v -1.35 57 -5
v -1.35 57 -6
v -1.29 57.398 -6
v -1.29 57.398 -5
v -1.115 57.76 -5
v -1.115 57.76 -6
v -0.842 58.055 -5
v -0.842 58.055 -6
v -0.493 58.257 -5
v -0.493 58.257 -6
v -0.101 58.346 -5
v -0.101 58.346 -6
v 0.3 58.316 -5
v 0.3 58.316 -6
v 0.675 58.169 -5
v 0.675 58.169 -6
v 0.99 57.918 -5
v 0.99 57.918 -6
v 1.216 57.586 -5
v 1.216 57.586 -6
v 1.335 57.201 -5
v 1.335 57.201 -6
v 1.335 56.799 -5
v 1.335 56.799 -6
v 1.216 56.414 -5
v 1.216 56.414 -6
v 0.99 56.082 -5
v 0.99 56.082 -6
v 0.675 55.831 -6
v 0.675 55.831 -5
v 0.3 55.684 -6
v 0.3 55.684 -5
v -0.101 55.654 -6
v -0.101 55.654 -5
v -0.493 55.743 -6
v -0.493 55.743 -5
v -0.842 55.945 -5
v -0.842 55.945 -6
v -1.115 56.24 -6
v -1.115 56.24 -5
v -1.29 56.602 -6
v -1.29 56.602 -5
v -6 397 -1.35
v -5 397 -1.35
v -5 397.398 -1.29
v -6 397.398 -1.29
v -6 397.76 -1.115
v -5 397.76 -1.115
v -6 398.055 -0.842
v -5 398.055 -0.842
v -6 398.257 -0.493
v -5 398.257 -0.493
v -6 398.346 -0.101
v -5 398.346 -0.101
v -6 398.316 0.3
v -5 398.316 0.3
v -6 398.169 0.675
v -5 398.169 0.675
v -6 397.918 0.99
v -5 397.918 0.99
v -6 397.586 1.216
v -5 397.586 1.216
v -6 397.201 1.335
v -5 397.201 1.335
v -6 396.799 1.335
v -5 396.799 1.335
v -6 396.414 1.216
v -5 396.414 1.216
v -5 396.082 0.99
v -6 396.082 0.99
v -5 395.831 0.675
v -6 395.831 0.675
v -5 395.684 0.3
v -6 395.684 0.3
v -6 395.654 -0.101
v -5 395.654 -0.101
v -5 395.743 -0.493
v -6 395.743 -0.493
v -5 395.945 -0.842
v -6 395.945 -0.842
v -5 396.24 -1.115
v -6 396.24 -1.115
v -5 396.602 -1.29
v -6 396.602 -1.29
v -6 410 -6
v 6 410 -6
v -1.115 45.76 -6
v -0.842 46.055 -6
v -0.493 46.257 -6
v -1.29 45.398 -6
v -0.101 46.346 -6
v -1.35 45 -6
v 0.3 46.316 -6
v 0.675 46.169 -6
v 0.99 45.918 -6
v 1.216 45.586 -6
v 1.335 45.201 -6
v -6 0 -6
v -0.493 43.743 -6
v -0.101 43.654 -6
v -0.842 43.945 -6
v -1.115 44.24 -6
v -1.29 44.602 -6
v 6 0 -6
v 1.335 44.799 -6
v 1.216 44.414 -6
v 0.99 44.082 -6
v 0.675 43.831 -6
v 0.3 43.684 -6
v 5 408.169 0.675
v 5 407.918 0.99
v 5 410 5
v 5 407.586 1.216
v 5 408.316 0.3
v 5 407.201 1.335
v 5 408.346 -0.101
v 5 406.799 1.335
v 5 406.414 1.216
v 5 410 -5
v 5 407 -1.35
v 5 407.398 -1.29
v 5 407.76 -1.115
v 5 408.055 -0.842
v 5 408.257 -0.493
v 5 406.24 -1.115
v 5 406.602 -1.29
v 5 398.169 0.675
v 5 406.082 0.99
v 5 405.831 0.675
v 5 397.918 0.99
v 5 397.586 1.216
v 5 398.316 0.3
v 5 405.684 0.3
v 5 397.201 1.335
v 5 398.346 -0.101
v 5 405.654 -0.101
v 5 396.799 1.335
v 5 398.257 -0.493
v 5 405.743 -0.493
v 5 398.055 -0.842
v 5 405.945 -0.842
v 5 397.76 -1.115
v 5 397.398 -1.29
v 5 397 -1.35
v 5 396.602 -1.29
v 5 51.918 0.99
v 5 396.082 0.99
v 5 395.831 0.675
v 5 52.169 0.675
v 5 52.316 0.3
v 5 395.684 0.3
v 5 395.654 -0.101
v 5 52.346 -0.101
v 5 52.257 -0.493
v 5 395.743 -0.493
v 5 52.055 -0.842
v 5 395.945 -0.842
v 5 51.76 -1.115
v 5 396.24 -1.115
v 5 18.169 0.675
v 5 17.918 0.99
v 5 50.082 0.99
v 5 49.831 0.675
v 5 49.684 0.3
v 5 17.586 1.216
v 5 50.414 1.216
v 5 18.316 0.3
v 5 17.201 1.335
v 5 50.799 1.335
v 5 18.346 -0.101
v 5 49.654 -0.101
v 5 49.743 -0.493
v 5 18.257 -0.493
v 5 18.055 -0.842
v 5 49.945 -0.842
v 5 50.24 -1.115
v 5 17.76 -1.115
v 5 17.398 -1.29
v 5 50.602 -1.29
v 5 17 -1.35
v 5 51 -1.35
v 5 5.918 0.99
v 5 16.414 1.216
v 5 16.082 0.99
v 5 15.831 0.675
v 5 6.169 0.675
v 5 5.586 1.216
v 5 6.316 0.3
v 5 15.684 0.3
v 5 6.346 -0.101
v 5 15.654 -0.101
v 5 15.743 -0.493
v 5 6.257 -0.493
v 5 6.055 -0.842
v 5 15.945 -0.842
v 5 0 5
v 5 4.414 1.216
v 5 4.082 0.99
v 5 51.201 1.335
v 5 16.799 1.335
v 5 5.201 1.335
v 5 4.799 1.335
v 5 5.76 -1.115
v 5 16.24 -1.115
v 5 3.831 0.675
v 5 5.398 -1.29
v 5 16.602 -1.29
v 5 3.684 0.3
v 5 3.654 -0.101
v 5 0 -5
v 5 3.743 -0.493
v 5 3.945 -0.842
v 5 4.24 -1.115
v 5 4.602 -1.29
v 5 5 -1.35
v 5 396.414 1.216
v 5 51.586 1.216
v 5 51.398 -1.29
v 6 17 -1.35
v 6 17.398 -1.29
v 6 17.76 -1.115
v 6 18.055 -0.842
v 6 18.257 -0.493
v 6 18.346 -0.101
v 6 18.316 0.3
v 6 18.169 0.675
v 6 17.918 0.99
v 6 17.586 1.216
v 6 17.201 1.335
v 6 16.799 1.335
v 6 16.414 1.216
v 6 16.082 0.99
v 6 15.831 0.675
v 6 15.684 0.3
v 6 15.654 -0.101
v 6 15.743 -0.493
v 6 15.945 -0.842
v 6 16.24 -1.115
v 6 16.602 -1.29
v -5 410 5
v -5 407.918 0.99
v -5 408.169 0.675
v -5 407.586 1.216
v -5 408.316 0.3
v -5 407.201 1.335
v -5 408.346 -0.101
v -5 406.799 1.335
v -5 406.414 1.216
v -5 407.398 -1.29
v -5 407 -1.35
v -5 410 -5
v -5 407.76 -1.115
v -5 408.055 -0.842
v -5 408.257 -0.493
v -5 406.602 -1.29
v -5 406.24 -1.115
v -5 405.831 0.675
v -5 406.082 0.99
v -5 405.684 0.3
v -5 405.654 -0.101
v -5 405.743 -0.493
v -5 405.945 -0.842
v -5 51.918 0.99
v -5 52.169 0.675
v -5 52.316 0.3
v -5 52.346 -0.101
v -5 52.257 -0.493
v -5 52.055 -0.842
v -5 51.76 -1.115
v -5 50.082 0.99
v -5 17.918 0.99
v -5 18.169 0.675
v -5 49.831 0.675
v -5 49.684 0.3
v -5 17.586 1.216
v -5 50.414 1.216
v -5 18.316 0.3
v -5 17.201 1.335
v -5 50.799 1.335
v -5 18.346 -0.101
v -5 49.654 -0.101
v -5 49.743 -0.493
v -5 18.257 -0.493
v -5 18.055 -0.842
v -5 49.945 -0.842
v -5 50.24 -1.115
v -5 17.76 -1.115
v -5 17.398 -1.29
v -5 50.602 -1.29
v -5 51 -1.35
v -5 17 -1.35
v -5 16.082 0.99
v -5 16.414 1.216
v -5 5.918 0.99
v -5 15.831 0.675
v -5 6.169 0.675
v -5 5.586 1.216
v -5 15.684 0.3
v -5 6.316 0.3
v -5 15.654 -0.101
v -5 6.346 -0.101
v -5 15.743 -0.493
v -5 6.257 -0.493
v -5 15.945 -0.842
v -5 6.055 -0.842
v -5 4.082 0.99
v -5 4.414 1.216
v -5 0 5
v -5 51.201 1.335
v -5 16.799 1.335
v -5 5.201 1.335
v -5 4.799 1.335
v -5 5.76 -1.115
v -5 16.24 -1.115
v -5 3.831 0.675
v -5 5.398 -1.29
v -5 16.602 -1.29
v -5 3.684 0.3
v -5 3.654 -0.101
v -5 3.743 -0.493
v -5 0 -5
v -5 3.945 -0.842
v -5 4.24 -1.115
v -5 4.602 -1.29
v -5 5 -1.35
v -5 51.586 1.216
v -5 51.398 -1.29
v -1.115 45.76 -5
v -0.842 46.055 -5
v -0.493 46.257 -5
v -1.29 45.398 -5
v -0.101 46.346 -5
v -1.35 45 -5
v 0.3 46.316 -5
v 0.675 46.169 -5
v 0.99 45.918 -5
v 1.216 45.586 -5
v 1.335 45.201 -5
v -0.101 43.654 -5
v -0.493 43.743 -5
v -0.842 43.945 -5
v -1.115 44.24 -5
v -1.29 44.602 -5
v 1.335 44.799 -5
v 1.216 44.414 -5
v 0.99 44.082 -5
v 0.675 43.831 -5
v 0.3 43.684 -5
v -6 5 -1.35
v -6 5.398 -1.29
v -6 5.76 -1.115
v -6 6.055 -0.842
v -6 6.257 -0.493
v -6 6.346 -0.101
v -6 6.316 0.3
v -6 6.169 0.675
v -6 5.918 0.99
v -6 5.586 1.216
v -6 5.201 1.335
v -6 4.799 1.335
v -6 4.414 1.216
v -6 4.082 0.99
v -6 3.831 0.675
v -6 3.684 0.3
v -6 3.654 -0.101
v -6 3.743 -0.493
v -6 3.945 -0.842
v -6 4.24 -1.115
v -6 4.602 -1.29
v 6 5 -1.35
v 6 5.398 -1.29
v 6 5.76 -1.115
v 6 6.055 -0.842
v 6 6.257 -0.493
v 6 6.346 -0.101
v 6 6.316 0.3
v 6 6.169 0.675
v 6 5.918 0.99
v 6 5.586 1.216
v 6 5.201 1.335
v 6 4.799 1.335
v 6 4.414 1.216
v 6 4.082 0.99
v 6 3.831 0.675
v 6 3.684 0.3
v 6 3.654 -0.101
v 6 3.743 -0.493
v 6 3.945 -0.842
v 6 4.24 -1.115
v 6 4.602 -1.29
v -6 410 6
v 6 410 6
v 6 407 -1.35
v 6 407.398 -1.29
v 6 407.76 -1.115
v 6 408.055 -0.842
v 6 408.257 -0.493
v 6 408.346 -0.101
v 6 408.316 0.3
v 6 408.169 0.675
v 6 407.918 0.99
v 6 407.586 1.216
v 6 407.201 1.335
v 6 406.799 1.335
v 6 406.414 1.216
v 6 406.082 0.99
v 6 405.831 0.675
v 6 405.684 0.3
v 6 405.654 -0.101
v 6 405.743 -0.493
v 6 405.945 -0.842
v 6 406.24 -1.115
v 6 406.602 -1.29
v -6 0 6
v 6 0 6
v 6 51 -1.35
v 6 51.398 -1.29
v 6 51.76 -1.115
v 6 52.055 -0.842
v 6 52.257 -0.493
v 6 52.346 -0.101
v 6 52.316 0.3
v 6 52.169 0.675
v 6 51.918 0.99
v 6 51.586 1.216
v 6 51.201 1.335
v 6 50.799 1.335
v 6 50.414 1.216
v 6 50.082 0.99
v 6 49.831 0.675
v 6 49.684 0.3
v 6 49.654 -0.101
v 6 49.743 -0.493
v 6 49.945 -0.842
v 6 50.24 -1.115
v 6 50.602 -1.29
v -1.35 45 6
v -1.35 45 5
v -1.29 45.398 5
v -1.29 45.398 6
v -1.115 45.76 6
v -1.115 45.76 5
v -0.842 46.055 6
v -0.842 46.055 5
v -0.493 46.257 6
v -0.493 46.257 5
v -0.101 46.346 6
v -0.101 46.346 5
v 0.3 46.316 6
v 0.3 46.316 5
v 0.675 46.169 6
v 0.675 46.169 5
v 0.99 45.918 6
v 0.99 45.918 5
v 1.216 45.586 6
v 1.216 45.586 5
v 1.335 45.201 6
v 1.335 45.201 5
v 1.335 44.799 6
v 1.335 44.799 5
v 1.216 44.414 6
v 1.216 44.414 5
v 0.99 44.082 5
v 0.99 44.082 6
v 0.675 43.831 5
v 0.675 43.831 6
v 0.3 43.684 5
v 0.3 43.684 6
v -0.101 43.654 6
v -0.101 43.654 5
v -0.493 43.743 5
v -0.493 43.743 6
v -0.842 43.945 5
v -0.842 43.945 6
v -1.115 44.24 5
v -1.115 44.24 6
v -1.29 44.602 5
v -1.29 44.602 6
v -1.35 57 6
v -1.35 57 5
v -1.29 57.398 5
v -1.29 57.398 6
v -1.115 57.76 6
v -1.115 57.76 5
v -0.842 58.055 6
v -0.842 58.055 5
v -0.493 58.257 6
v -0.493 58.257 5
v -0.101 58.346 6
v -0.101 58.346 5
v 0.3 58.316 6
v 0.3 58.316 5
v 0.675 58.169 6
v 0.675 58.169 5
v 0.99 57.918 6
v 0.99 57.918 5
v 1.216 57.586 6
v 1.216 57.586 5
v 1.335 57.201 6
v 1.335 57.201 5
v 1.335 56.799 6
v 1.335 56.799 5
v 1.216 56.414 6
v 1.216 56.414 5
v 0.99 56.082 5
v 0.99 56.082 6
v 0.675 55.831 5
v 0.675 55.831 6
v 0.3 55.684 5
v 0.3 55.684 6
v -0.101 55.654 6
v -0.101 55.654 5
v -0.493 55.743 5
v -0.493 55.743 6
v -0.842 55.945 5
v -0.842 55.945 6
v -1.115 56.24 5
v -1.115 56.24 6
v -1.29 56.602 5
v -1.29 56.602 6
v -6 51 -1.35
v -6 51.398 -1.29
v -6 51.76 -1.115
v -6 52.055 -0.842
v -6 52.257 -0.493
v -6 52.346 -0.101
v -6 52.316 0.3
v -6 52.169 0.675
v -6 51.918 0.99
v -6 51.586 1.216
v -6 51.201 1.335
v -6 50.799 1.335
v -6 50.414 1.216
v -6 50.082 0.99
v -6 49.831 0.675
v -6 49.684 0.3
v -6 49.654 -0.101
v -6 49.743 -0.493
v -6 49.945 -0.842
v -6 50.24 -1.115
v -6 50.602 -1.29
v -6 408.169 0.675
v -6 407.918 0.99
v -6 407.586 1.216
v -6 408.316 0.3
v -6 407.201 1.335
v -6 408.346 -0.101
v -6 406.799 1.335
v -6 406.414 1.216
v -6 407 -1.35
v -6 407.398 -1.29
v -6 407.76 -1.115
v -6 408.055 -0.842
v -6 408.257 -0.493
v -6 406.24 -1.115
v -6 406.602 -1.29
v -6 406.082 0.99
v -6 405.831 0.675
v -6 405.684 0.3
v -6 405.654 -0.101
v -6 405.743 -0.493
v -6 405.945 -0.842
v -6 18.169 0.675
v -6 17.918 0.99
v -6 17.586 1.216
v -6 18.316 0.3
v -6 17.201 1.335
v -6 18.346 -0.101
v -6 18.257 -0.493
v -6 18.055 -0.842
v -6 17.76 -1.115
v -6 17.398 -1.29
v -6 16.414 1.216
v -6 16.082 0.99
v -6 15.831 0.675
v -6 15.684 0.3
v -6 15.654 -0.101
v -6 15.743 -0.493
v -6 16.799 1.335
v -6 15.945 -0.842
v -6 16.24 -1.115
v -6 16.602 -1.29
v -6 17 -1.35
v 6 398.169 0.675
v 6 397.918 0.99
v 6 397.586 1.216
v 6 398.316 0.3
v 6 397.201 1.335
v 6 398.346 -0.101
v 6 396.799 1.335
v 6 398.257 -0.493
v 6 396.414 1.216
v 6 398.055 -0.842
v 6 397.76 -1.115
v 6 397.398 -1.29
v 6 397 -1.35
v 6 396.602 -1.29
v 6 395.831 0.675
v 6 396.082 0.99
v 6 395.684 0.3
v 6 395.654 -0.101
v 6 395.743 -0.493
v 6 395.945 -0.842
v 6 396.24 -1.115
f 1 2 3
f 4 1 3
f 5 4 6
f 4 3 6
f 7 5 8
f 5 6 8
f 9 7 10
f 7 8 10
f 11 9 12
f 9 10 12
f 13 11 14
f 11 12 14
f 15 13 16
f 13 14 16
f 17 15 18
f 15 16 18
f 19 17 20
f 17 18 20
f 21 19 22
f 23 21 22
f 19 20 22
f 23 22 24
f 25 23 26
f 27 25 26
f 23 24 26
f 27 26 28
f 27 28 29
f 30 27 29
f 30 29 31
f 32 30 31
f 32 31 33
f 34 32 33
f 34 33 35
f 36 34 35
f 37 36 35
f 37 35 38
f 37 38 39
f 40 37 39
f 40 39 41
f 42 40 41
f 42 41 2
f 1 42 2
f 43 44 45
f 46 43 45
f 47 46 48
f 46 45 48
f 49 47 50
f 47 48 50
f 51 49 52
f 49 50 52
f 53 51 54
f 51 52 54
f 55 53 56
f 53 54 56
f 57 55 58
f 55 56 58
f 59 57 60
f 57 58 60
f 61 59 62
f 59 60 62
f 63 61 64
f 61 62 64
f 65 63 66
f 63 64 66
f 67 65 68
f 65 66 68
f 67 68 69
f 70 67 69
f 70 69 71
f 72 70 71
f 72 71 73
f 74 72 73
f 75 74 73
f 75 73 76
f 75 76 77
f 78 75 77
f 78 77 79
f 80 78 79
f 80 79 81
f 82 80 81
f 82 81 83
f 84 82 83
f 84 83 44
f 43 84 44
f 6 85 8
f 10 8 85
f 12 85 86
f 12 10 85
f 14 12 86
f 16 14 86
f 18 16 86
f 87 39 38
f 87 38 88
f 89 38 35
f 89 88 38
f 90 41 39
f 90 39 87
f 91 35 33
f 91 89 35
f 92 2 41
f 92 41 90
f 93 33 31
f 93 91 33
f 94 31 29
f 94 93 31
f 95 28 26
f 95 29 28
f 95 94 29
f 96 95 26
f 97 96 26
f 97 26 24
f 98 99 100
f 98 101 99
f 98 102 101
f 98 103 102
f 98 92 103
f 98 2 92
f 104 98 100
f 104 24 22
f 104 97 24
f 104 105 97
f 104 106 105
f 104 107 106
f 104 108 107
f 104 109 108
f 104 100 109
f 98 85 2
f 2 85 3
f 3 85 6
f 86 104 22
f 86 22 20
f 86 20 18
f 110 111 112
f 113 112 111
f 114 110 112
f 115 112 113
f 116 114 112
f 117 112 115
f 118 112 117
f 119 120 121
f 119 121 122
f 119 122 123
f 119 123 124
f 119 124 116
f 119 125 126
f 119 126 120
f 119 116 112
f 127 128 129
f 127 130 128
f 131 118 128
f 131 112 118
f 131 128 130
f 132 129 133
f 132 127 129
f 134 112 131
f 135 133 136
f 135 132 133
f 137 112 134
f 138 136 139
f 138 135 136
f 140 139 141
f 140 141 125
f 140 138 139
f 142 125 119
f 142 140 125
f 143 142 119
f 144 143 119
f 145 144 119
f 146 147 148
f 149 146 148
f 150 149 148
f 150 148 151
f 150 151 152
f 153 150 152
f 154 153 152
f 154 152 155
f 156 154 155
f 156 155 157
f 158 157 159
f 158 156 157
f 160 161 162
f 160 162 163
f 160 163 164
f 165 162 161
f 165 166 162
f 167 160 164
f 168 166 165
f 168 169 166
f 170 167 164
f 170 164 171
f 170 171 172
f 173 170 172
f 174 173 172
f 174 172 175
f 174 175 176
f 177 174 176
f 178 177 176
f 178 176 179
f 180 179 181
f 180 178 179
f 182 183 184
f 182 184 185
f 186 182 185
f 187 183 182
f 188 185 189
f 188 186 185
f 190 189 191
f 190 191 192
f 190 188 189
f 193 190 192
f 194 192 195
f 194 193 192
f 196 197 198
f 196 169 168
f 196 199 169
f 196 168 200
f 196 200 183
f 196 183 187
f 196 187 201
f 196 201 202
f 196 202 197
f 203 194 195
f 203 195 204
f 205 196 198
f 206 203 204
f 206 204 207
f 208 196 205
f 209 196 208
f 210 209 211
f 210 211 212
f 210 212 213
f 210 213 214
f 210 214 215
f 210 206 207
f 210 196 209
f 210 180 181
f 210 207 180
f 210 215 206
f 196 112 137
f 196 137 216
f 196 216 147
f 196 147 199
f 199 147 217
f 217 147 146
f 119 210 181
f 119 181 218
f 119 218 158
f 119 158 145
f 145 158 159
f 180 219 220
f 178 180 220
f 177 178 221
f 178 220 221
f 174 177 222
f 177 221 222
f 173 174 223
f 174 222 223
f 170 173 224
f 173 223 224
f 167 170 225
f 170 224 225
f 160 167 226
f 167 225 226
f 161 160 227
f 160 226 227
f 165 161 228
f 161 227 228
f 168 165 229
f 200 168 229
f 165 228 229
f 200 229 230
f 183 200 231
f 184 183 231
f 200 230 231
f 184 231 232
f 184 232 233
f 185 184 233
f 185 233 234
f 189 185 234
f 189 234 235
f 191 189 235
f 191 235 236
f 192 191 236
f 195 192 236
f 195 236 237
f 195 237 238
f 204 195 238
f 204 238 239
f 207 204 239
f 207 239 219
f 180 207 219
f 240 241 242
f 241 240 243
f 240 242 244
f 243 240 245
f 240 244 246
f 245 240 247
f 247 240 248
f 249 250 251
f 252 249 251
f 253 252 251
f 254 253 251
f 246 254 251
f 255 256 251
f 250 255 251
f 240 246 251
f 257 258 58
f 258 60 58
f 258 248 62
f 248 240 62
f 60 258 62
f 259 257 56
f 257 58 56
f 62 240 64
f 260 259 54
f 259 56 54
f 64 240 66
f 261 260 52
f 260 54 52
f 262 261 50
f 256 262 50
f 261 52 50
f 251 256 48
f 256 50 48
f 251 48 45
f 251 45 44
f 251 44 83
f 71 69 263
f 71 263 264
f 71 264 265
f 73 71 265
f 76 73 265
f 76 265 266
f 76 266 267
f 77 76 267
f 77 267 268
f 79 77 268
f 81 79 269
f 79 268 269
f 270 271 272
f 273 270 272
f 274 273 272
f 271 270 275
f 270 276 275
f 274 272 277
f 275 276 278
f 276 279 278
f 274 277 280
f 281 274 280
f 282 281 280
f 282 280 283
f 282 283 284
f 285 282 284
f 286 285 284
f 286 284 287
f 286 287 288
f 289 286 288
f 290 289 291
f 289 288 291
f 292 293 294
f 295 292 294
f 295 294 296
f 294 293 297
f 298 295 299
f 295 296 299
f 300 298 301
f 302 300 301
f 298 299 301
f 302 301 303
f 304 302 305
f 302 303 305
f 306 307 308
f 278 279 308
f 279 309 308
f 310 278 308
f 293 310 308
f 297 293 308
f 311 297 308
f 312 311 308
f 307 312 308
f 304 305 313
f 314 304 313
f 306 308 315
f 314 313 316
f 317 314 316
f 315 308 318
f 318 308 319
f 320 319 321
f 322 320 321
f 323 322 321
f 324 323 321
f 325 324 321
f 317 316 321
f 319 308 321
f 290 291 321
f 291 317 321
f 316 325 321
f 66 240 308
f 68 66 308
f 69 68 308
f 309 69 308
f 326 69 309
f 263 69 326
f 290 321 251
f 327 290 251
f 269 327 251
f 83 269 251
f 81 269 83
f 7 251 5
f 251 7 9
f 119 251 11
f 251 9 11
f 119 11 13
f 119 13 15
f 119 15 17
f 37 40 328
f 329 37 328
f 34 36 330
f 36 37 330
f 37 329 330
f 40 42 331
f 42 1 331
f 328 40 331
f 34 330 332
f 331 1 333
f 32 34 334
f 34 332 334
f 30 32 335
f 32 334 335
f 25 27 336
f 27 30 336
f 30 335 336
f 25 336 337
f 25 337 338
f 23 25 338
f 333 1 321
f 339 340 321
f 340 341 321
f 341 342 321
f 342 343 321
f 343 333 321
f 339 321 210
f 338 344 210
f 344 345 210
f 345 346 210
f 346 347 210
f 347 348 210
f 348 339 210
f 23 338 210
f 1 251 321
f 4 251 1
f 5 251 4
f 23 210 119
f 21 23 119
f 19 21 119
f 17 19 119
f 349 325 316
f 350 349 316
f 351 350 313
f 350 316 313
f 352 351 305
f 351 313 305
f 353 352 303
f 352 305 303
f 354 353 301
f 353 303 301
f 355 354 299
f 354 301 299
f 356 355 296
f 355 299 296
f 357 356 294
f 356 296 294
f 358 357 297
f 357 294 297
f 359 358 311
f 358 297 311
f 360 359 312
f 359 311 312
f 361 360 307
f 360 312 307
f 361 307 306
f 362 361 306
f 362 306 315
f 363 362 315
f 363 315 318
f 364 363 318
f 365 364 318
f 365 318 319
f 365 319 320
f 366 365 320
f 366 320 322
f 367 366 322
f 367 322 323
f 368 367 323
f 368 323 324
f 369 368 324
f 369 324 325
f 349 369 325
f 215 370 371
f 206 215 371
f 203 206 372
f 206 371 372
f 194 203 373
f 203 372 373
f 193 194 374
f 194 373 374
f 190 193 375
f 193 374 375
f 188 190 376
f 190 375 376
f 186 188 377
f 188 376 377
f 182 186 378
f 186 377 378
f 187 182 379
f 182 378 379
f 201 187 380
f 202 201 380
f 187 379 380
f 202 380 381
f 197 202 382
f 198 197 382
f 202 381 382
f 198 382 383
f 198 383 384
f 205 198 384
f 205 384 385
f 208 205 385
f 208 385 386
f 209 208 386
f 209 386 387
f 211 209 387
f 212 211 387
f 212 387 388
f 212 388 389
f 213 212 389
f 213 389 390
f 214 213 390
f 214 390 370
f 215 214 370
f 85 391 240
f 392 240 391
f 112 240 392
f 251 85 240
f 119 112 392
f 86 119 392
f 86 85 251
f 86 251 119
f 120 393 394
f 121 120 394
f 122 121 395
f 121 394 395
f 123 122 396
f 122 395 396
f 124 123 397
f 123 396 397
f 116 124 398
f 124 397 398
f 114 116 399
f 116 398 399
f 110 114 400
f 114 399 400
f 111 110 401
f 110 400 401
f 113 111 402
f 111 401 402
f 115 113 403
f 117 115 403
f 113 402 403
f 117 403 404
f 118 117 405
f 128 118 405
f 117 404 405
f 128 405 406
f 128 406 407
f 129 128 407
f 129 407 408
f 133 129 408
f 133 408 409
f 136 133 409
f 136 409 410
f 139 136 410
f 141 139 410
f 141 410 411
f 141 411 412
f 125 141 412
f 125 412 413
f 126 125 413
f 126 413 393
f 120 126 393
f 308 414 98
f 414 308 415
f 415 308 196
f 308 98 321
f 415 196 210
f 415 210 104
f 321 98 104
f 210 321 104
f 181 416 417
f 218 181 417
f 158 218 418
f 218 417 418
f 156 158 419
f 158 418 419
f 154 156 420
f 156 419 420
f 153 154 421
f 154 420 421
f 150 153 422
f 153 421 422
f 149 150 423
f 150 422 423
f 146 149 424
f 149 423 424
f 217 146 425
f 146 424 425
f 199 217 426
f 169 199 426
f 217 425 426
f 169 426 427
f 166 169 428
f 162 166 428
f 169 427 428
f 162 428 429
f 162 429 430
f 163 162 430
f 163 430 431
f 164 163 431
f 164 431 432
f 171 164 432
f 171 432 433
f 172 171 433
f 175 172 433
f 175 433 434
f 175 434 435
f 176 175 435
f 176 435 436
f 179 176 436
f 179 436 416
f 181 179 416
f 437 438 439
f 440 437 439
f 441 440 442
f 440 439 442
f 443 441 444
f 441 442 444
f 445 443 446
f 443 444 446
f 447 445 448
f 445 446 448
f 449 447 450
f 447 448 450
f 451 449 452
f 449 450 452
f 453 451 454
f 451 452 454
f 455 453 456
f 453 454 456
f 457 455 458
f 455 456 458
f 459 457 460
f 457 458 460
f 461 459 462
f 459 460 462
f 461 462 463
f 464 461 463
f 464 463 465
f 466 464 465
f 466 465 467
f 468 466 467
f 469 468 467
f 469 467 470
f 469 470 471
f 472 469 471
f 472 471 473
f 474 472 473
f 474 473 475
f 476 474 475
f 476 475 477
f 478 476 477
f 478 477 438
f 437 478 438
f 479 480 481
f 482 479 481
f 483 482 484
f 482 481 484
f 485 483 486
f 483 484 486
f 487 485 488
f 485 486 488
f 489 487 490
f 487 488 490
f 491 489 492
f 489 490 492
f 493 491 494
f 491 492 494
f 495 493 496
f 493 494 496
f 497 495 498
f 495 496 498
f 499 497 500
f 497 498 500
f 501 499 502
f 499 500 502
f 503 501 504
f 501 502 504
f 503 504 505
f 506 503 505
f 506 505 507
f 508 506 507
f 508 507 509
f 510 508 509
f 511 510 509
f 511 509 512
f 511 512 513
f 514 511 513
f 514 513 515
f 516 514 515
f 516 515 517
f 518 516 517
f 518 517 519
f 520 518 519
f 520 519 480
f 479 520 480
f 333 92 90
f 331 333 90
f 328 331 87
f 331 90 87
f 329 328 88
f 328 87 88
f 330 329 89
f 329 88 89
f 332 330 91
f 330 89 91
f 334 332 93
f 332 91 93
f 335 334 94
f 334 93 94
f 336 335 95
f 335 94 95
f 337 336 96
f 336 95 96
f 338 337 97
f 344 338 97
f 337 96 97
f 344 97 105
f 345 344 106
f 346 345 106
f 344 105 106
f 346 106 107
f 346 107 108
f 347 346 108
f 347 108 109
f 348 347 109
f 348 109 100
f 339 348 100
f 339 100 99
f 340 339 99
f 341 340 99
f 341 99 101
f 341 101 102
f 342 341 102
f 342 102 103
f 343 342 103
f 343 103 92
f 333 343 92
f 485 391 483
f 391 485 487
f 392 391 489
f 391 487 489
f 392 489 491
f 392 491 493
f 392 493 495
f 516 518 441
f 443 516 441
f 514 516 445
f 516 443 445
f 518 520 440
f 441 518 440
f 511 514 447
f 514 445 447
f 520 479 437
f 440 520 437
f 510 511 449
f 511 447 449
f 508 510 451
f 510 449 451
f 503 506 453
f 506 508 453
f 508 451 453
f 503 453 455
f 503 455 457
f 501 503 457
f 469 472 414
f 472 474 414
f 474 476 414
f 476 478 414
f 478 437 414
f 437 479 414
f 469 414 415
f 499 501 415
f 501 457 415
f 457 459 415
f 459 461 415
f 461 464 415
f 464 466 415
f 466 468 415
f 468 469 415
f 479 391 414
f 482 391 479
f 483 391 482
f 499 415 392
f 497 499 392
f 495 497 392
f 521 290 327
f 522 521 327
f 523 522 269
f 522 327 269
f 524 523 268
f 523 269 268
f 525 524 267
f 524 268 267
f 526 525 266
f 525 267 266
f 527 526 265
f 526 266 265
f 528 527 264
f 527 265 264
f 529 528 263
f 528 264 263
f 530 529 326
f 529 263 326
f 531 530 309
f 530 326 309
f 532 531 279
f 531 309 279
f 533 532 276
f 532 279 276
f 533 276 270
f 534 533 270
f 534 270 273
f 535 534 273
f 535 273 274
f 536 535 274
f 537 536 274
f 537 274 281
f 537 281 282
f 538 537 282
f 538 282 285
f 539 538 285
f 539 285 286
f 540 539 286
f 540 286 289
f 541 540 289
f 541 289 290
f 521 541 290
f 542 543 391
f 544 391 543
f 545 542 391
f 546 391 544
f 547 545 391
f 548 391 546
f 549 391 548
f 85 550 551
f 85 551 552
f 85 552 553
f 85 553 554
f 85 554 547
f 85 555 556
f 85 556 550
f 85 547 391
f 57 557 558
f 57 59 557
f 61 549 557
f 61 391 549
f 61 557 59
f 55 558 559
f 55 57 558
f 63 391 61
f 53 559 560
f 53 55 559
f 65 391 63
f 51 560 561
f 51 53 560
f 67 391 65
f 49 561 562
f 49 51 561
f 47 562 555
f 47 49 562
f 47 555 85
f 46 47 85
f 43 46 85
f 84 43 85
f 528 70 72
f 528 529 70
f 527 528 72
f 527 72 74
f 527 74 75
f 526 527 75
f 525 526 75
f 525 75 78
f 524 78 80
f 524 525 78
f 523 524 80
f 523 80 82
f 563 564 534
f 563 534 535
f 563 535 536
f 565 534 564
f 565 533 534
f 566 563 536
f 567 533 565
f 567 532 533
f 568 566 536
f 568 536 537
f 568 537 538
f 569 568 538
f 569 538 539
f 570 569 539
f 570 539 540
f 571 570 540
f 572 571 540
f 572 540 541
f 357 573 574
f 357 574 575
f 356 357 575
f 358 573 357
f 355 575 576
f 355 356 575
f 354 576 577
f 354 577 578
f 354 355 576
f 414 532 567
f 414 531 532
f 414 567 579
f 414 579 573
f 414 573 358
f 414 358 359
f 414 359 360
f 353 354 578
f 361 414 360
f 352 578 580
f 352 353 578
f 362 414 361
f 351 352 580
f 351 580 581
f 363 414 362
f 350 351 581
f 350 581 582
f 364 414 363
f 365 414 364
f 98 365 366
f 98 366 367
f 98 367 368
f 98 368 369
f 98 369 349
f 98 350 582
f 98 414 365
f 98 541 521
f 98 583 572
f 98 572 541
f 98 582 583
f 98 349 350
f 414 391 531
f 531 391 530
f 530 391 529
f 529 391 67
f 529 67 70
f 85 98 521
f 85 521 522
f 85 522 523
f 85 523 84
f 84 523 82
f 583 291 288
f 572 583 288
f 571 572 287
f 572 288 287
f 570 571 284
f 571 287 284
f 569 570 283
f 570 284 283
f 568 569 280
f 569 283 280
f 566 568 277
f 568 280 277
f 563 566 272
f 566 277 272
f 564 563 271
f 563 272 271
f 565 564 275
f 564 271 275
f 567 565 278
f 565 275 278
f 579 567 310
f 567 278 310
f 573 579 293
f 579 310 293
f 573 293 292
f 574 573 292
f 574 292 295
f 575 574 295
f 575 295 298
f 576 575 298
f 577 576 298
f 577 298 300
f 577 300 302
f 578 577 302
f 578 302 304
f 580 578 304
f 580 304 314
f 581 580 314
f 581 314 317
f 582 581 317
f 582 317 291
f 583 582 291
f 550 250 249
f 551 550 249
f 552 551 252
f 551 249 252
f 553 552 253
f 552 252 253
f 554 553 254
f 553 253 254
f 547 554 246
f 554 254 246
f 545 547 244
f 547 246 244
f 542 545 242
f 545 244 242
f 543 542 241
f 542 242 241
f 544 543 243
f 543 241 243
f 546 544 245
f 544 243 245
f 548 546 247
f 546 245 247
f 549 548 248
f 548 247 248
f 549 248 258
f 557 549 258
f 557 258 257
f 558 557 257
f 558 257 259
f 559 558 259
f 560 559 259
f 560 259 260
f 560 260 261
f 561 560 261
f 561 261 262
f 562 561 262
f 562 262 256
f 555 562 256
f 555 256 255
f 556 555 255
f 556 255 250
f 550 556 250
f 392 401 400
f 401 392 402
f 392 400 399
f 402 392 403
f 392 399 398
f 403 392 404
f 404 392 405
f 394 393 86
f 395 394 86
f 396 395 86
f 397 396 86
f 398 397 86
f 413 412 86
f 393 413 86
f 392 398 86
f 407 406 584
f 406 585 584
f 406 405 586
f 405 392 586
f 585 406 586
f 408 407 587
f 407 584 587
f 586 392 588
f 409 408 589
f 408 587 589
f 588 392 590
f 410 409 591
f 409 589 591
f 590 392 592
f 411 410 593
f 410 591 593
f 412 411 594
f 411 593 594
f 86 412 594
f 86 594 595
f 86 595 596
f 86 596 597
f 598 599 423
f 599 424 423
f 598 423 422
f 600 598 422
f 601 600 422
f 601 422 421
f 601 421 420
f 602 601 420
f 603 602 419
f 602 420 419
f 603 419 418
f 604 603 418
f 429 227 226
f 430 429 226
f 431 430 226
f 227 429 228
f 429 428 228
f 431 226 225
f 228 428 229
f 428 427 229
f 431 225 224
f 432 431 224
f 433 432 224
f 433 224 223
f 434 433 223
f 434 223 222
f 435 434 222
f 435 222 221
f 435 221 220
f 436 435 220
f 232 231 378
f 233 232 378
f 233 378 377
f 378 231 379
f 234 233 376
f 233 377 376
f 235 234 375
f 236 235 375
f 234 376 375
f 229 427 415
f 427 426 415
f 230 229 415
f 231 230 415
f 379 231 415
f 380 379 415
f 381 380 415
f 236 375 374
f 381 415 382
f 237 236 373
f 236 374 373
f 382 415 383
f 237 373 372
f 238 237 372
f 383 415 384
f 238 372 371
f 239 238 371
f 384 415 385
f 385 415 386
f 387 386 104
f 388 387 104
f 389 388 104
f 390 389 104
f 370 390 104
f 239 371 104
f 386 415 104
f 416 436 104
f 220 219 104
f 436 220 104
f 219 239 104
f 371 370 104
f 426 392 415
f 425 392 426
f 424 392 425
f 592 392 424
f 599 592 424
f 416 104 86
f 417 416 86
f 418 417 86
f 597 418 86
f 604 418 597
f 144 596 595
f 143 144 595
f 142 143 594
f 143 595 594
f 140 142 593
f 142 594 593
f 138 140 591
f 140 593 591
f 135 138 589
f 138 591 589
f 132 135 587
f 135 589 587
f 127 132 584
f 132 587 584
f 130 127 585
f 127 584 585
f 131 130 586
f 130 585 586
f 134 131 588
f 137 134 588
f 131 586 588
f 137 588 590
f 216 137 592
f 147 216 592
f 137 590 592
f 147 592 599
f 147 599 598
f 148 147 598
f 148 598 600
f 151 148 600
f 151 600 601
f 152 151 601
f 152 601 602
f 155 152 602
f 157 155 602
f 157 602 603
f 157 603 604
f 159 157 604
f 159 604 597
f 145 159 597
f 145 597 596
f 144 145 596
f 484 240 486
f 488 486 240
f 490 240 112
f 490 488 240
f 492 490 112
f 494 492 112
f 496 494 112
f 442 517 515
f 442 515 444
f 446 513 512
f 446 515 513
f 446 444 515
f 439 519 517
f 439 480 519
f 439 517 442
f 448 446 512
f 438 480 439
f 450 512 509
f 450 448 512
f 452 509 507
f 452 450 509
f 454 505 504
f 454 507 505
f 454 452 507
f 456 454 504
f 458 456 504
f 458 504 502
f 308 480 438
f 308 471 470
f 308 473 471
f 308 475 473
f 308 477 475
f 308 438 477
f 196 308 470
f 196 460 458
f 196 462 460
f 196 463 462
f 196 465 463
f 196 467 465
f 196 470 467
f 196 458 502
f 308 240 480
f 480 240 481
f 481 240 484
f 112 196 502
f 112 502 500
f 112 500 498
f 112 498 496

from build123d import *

# Parameters (mm, degrees)
SKETCH_1_W          = 12
SKETCH_1_H          = 12
SKETCH_1_W_2        = 10
SKETCH_1_H_2        = 10
EXTRUDE_1_DEPTH     = 410
SKETCH_2_R          = 1.35
CUT_EXTRUDE_1_DEPTH = 411.219453464
SKETCH_3_R          = 1.35
CUT_EXTRUDE_2_DEPTH = 411.219453464
SKETCH_4_R          = 1.35
CUT_EXTRUDE_3_DEPTH = 411.219453464


with BuildPart() as part:
    # 草图1 → 凸台-拉伸1 (new body)
    with BuildSketch(Plane(origin=(0, 0, 0), x_dir=(1, 0, 0), z_dir=(0, 1, 0))):
        Rectangle(SKETCH_1_W, SKETCH_1_H)
        Rectangle(SKETCH_1_W_2, SKETCH_1_H_2, mode=Mode.SUBTRACT)
    extrude(amount=EXTRUDE_1_DEPTH)

    # 草图2 → 切除-拉伸1 (cut, through all)
    with BuildSketch(Plane(origin=(6, 0, 0), x_dir=(0, 0, -1), z_dir=(1, 0, 0))):
        with Locations((0, 5)):
            Circle(SKETCH_2_R)
        with Locations((0, 17)):
            Circle(SKETCH_2_R)
        with Locations((0, 51)):
            Circle(SKETCH_2_R)
    extrude(amount=-CUT_EXTRUDE_1_DEPTH, mode=Mode.SUBTRACT)

    # 草图3 → 切除-拉伸2 (cut, through all)
    with BuildSketch(Plane(origin=(6, 0, 0), x_dir=(0, 0, -1), z_dir=(1, 0, 0))):
        with Locations((0, 407)):
            Circle(SKETCH_3_R)
        with Locations((0, 397)):
            Circle(SKETCH_3_R)
    extrude(amount=-CUT_EXTRUDE_2_DEPTH, mode=Mode.SUBTRACT)

    # 草图4 → 切除-拉伸3 (cut, through all)
    with BuildSketch(Plane(origin=(0, 0, -6), x_dir=(-1, 0, 0), z_dir=(0, 0, -1))):
        with Locations((0, 45)):
            Circle(SKETCH_4_R)
        with Locations((0, 57)):
            Circle(SKETCH_4_R)
    extrude(amount=-CUT_EXTRUDE_3_DEPTH, mode=Mode.SUBTRACT)


solid = part.part
